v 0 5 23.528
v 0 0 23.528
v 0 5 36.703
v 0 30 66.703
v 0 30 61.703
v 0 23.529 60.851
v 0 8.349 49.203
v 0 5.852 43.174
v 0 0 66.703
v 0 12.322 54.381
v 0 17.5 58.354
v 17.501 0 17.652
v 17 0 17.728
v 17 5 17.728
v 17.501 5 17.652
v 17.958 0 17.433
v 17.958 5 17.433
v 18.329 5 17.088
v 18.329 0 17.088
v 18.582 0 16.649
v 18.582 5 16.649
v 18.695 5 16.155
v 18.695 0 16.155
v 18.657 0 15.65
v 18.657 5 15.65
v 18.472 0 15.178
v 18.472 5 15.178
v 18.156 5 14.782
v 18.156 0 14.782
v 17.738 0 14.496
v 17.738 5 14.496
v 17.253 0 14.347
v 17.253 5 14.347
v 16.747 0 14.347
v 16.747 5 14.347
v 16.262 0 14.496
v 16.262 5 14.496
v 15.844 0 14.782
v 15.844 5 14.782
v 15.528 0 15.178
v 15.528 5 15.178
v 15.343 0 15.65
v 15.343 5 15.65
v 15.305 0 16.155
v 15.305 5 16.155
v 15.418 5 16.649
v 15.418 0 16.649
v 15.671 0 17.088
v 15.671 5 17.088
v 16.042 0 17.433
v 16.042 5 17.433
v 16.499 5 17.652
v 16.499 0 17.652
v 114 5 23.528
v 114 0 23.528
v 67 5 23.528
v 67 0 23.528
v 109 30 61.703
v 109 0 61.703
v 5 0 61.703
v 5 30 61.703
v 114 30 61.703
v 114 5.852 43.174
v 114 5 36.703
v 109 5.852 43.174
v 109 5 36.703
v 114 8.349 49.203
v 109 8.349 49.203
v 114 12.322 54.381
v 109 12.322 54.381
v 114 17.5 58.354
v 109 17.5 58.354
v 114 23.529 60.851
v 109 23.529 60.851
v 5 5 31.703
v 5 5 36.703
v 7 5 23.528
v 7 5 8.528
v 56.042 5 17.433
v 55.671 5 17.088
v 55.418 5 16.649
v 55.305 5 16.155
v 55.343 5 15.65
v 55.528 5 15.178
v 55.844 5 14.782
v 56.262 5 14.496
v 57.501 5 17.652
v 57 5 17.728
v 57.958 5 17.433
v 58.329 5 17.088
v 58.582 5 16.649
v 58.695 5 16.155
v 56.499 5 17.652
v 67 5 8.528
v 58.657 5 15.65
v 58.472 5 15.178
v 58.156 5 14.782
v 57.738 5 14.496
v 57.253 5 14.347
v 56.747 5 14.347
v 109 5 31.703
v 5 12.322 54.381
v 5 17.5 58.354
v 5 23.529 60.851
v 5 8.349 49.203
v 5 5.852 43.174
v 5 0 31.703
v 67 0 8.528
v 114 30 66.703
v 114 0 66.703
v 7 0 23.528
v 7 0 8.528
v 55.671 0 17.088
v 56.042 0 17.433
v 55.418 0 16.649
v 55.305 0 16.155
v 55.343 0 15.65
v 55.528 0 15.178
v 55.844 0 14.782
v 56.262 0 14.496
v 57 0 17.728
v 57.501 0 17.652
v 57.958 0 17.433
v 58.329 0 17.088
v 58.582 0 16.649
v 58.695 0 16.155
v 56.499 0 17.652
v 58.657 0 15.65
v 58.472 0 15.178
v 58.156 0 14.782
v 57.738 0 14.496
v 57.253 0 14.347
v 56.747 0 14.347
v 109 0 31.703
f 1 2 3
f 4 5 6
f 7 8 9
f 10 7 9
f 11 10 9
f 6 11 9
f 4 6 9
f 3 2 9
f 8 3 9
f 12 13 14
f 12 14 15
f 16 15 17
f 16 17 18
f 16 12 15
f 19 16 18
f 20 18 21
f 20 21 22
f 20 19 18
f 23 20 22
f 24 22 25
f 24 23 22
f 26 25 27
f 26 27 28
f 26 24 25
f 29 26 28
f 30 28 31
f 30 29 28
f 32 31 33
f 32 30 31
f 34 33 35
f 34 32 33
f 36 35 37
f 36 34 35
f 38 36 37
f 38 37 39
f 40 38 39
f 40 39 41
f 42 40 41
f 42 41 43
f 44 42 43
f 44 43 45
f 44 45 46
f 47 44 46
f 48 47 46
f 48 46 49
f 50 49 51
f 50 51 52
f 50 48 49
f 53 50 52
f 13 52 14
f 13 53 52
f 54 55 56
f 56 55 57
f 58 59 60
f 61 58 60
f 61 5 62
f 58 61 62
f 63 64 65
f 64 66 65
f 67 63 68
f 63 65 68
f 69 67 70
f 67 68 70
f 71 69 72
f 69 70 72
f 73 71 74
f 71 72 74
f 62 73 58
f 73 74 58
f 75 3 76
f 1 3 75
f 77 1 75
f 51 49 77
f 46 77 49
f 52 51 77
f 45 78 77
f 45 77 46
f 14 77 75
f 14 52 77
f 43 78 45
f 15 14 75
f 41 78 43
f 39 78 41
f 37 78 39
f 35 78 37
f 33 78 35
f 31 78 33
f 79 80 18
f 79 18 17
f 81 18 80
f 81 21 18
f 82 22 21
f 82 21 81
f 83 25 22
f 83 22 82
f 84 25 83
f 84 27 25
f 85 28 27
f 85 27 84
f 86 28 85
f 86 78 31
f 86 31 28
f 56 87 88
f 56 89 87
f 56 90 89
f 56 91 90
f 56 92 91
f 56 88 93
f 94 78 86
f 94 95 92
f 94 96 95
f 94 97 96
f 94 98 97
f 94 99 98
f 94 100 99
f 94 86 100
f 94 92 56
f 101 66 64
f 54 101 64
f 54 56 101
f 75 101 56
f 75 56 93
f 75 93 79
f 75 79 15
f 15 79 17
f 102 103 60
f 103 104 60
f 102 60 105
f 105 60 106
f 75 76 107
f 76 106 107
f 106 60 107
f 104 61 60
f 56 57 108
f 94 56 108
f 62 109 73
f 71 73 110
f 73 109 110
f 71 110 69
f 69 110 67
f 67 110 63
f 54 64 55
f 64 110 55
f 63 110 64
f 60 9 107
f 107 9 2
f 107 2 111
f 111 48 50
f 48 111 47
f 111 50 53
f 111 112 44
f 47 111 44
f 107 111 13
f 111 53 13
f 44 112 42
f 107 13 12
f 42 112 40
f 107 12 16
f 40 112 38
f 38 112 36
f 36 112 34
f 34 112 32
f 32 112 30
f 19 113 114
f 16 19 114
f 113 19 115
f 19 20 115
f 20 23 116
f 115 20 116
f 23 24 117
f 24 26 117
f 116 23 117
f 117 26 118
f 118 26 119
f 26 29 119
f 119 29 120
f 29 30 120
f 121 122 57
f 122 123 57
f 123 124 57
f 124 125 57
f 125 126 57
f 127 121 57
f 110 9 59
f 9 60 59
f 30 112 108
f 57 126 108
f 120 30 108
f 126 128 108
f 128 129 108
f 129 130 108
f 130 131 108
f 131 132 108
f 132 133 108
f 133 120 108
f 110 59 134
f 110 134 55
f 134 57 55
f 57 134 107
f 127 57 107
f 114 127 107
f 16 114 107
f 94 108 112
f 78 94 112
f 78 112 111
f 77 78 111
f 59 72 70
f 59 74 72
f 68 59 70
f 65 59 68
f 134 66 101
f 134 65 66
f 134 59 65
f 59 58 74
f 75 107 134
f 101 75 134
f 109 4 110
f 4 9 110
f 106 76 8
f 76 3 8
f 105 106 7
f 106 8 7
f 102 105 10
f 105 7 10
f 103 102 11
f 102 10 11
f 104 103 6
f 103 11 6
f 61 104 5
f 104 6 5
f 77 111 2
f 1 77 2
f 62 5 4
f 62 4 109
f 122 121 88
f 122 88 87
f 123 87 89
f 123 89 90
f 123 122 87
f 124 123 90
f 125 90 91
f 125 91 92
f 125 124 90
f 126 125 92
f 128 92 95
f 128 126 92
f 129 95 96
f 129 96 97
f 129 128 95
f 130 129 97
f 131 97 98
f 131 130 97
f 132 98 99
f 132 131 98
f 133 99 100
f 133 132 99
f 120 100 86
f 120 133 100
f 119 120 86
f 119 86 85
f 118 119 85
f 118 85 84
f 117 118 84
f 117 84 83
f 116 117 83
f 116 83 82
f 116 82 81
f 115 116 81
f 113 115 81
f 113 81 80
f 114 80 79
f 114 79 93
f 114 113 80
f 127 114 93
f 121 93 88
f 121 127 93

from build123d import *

# Parameters (mm, degrees)
SKETCH1_W           = 104
SKETCH1_H           = 30
SKETCH1_R           = 1.7
BOSS_EXTRUDE1_DEPTH = 5
BOSS_EXTRUDE2_DEPTH = 25
FILLET1_R           = 25


with BuildPart() as part:
    # Sketch1 → Boss-Extrude1 (new body)
    with BuildSketch(Plane(origin=(0, 0, 0), x_dir=(1, 0, 0), z_dir=(0, 1, 0))):
        Polygon((67, -8.528010066), (7, -8.528010066), (7, -23.528010066), (0, -23.528010066), (0, -66.703010066), (114, -66.703010066), (114, -23.528010066), (67, -23.528010066), align=None)
        with Locations((57, -46.703010066)):
            Rectangle(SKETCH1_W, SKETCH1_H, mode=Mode.SUBTRACT)
        with Locations(Location((17, -16.028010066, 0), (0, 0, 270))):
            Circle(SKETCH1_R, mode=Mode.SUBTRACT)
        with Locations(Location((57, -16.028010066, 0), (0, 0, 270))):
            Circle(SKETCH1_R, mode=Mode.SUBTRACT)
    extrude(amount=BOSS_EXTRUDE1_DEPTH)

    # Sketch2 → Boss-Extrude2 (add)
    with BuildSketch(Plane(origin=(0, 5, 0), x_dir=(1, 0, 0), z_dir=(0, 1, 0))):
        Polygon((5, -61.703010066), (0, -61.703010066), (0, -66.703010066), (114, -66.703010066), (114, -61.703010066), align=None)
    extrude(amount=BOSS_EXTRUDE2_DEPTH)

    # Fillet1
    fillet1_edges = [part.edges().sort_by_distance(p)[0] for p in [
        (2.5, 5, 61.703010066),
        (111.5, 5, 61.703010066),
    ]]
    fillet(fillet1_edges, radius=FILLET1_R - 0.0001)  # a hair under: the kernel refuses the full size


solid = part.part
